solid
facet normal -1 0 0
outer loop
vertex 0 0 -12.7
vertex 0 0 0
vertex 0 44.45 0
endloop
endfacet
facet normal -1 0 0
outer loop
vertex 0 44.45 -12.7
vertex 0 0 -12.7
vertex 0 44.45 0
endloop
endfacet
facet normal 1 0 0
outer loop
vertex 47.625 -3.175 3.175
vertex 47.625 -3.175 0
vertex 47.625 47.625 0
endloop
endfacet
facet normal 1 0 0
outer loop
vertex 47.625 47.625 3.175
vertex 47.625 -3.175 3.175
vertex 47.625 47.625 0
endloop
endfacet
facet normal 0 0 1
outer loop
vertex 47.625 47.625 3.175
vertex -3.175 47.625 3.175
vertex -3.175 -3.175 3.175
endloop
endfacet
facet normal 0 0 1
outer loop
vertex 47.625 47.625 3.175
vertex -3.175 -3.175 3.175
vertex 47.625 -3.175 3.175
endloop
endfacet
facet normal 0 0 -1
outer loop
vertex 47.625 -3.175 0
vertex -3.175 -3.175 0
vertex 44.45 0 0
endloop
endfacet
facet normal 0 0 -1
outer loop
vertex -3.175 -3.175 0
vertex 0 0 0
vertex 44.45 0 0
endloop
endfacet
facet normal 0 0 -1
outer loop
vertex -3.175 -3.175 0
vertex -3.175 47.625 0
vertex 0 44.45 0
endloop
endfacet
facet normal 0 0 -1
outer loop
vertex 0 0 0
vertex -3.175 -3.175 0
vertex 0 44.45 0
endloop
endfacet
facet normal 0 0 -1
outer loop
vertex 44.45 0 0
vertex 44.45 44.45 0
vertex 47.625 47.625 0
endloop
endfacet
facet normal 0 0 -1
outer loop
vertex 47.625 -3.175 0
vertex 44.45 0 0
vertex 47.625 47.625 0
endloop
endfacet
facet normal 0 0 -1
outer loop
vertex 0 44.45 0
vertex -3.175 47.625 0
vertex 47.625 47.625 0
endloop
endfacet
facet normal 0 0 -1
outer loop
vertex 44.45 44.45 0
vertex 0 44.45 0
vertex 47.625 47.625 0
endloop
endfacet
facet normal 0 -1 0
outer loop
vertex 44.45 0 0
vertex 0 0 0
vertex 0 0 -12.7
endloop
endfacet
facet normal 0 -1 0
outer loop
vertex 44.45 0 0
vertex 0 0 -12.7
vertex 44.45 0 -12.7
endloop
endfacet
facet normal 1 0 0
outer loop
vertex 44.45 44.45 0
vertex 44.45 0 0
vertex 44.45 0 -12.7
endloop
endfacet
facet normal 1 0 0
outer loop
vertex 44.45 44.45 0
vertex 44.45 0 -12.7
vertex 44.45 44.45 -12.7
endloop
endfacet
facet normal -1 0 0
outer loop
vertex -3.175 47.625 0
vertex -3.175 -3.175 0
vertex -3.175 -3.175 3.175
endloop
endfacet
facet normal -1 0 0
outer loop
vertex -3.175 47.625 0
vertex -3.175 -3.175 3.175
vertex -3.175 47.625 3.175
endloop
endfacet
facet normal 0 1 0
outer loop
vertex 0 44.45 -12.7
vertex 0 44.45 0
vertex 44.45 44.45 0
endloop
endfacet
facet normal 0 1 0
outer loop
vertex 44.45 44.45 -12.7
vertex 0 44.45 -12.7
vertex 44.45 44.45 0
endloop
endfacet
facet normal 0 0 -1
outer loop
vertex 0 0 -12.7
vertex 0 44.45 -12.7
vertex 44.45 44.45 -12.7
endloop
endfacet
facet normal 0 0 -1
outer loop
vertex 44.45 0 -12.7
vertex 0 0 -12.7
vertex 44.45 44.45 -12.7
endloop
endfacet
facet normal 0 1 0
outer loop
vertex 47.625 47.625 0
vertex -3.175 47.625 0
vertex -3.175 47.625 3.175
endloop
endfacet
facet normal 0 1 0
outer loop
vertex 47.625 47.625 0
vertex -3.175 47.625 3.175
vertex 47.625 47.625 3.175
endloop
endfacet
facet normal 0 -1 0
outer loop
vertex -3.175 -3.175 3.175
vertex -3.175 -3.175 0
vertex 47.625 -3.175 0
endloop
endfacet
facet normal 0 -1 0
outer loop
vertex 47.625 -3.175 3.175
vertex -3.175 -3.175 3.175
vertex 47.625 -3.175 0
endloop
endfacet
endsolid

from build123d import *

# Parameters (mm, degrees)
SKETCH1_W           = 50.8
SKETCH1_H           = 50.8
BOSS_EXTRUDE1_DEPTH = 3.175
SKETCH1_4_W         = 44.45
SKETCH1_4_H         = 44.45
BOSS_EXTRUDE2_DEPTH = 12.7


with BuildPart() as part:
    # Sketch1 → Boss-Extrude1 (new body)
    with BuildSketch(Plane.XY):
        with Locations((22.225, 22.225)):
            Rectangle(SKETCH1_W, SKETCH1_H)
    extrude(amount=BOSS_EXTRUDE1_DEPTH)

    # Sketch1<4> → Boss-Extrude2 (add)
    with BuildSketch(Plane.XY):
        with Locations((22.225, 22.225)):
            Rectangle(SKETCH1_4_W, SKETCH1_4_H)
    extrude(amount=-BOSS_EXTRUDE2_DEPTH)


solid = part.part
